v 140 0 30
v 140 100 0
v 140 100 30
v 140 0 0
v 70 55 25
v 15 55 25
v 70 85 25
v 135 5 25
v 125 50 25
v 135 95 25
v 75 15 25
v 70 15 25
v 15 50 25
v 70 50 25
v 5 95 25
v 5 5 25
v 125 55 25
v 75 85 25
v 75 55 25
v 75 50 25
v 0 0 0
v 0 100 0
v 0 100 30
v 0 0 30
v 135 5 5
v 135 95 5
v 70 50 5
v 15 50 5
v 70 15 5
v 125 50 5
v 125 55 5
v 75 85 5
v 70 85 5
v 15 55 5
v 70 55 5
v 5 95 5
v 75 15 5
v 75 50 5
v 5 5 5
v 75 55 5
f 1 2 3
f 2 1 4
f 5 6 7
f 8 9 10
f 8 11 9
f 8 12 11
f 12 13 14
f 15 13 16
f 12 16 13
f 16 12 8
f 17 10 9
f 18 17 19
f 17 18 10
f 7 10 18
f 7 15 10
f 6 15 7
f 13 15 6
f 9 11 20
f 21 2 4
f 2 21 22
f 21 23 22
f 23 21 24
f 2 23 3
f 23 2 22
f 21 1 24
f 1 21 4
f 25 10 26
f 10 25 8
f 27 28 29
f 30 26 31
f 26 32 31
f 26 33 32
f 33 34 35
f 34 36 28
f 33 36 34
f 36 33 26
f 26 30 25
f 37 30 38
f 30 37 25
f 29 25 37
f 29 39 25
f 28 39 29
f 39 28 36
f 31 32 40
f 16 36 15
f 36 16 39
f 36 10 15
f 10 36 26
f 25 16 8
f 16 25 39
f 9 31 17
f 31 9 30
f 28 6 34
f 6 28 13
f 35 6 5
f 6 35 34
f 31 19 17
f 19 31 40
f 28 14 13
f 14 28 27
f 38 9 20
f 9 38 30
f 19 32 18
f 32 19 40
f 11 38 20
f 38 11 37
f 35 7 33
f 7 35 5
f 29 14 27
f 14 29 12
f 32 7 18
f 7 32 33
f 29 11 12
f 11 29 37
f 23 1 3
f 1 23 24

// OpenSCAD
// iPhone Holder — стенд-база
// Внешние размеры: 140 x 100 x 20 мм
// Толщина стенок: 5 мм
// Внутри полый (открытый сверху)

$fn = 128;

// Толщина стенок
wall = 5;

// внешний параллелипипед
inner_h = 20;
	
// Наружный параллелепипед
outer_w = 140;
outer_d = 100;
outer_h = inner_h + wall;

// Толщина крышки
lid_h = wall;

// Зазор ребер от стенок (для перелива воды)
gap = 10;

// Высота ребер (от дна до верха полости)
rib_h = inner_h;

// Основной корпус
color("#4a90d9")
difference() {
    // Внешняя форма
    cube([outer_w, outer_d, outer_h]);

    // Внутренняя полость (открыта сверху)
    translate([wall, wall, wall])
        cube([
            outer_w - 2 * wall,
            outer_d - 2 * wall,
            outer_h - wall + 1  // стенка снизу 5мм, сверху открыто
        ]);
}

// Рёбра жесткости — контрастный цвет, с зазором от стенок для перелива воды
color("#f5a623")
union() {
    // Ребро вдоль X (посередине Y)
    translate([wall + gap, outer_d / 2, wall])
        cube([outer_w - 2 * wall - 2 * gap, wall, rib_h]);

    // Ребро вдоль Y (посередине X)
    translate([outer_w / 2, wall + gap, wall])
        cube([wall, outer_d - 2 * wall - 2 * gap, rib_h]);
}

// Крышка сверху — другой цвет, точно примыкает
color("#e85d3a")
translate([0, 0, outer_h])
    cube([outer_w, outer_d, lid_h]);
